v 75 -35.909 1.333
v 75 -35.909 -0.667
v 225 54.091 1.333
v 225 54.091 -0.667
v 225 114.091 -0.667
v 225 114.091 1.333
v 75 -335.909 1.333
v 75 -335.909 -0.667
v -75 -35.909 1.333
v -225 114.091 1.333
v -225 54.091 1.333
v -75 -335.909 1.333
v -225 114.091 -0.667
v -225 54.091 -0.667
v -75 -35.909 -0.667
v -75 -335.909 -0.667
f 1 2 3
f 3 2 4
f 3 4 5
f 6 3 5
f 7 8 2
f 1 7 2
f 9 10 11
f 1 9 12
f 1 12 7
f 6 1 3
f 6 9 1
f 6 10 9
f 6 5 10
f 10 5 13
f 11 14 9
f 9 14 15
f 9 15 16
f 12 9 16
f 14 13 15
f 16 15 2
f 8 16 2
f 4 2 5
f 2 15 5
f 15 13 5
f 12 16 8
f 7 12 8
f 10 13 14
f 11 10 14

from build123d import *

# Parameters (mm, degrees)
BOSS_EXTRUDE1_DEPTH = 0.666666667
SCALE1_SCALE        = 3


with BuildPart() as part:
    # Sketch1 → Boss-Extrude1 (new body)
    with BuildSketch(Plane.XY):
        Polygon((75, 0), (-75, 0), (-75, -20), (-25, -50), (-25, -149.999999898), (25, -149.999999898), (25, -50), (75, -20), align=None)
    extrude(amount=BOSS_EXTRUDE1_DEPTH)


with BuildPart() as part_1:
    # Scale1: scaled about (0, -57.045454502, 0.333333333)
    add(part.part.scale(SCALE1_SCALE).moved(Location((0, 114.090909004, -0.666666666))))


solid = part_1.part
